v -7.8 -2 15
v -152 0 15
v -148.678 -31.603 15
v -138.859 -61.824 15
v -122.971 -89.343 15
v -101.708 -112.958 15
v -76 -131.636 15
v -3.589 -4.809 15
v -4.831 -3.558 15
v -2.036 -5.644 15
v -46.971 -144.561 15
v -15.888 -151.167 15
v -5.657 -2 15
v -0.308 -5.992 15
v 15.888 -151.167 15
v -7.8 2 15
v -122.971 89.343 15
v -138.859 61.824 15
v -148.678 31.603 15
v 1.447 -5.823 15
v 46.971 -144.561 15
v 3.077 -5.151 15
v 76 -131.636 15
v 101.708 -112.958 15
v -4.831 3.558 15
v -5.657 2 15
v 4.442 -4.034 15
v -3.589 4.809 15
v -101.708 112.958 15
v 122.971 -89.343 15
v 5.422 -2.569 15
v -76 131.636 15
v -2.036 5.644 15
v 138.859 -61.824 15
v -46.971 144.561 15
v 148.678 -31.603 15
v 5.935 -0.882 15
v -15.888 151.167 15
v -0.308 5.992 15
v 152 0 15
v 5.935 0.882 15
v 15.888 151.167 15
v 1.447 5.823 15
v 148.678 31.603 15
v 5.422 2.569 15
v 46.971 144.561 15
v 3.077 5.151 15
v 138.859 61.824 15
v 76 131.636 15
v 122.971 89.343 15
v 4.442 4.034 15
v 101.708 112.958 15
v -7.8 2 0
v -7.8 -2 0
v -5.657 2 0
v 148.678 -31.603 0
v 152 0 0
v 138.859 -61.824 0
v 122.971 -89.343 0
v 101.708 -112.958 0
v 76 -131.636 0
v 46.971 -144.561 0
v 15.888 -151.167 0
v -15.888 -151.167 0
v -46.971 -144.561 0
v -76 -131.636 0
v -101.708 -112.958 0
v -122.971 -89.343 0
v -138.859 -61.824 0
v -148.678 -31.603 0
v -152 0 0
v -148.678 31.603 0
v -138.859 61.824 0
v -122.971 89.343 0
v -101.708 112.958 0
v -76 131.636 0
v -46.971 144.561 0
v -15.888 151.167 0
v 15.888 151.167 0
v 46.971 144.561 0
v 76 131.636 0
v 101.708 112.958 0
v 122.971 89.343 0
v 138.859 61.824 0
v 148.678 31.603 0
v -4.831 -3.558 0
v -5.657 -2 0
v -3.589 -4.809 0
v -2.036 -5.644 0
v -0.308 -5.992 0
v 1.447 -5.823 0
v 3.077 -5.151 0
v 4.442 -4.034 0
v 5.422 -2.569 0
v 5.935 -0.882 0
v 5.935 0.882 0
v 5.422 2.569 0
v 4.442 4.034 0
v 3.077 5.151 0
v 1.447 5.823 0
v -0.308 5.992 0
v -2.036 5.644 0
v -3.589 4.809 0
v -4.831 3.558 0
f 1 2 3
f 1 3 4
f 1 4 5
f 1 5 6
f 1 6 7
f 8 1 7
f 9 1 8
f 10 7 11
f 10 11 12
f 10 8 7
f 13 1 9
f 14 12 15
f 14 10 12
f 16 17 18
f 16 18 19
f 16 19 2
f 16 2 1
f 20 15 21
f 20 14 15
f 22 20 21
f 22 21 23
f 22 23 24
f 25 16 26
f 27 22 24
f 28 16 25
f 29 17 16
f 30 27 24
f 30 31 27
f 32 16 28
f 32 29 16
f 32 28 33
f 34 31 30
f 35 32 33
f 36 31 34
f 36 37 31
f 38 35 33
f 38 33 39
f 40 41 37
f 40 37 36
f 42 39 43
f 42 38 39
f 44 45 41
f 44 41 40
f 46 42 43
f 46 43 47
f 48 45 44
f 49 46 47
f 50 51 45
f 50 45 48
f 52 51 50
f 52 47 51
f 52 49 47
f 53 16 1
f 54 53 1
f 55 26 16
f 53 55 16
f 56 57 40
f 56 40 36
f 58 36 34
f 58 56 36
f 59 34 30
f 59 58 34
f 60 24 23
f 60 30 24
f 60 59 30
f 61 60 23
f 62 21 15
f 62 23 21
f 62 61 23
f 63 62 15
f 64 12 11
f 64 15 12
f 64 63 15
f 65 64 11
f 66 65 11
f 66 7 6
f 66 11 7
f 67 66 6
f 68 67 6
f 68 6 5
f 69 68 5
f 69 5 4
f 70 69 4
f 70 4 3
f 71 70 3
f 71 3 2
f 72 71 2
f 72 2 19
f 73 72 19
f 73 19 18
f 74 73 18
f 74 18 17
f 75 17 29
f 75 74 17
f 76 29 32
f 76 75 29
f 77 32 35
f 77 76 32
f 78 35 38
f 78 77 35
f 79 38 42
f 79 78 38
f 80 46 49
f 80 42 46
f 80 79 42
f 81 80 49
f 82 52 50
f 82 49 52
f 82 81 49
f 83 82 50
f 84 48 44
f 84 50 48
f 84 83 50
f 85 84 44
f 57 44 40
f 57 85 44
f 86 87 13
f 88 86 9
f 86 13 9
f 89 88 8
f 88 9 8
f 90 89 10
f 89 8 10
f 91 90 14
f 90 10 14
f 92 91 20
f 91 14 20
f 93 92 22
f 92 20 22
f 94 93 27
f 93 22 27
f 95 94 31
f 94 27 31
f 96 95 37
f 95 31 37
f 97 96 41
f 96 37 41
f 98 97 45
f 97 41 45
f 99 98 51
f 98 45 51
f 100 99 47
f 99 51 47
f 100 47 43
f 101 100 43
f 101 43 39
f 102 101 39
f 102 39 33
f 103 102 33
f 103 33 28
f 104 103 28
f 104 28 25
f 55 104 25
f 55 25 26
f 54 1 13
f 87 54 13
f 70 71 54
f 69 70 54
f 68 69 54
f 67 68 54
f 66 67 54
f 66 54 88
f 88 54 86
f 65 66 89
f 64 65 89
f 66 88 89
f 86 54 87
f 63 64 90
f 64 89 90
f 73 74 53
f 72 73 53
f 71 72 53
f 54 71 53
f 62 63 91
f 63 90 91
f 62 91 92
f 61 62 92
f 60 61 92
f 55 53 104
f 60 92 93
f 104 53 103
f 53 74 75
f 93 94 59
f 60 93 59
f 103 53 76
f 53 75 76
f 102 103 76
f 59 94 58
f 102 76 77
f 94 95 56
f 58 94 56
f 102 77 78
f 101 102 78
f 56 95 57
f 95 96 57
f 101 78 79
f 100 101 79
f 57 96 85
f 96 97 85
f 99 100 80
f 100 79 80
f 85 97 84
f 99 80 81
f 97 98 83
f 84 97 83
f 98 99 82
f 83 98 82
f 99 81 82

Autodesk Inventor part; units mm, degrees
ref_plane "YZ Plane" through (0, 0, 0) normal (1, 0, 0) x (0, 1, 0)
ref_plane "XZ Plane" through (0, 0, 0) normal (0, 1, 0) x (-1, 0, 0)
ref_plane "XY Plane" through (0, 0, 0) normal (0, 0, 1) x (1, 0, 0)
sketch "スケッチ1" plane through (0, 0, 0) normal (0, 0, 1) x (1, 0, 0)
  circle A0 centre (0, 0) radius 152
  dimension "d0" = 304
extrude "押し出し1" add sketch "スケッチ1" along normal blind 15
sketch "スケッチ2" plane through (0, 0, 0) normal (0, 0, -1) x (-1, 0, 0)
  point P0 (0, 0)
  point P1 (0, 0)
hole "穴1" at (0, 0, 0) direction (0, 0, 1) diameter 12 end through all
sketch "スケッチ3" plane through (0, 0, 0) normal (0, 0, -1) x (-1, 0, 0)
  circle A0 centre (0, 0) radius 6 projected
sketch "スケッチ4" plane through (0, 0, 15) normal (0, 0, 1) x (1, 0, 0)
  line L0 (-7.8, -2) -> (-2.8778, -2)
  line L1 (-2.8778, -2) -> (-2.8778, 2)
  line L2 (-2.8778, 2) -> (-7.8, 2)
  line L3 (-7.8, 2) -> (-7.8, -2)
  point P0 (0, 0)
  point P1 (-7.8, 0)
  dimension "d10" = 7.8
  dimension "d11" = 2
  dimension "d12" = 2
extrude "押し出し2" cut sketch "スケッチ4" against normal blind 20
properties part number "計測輪"
